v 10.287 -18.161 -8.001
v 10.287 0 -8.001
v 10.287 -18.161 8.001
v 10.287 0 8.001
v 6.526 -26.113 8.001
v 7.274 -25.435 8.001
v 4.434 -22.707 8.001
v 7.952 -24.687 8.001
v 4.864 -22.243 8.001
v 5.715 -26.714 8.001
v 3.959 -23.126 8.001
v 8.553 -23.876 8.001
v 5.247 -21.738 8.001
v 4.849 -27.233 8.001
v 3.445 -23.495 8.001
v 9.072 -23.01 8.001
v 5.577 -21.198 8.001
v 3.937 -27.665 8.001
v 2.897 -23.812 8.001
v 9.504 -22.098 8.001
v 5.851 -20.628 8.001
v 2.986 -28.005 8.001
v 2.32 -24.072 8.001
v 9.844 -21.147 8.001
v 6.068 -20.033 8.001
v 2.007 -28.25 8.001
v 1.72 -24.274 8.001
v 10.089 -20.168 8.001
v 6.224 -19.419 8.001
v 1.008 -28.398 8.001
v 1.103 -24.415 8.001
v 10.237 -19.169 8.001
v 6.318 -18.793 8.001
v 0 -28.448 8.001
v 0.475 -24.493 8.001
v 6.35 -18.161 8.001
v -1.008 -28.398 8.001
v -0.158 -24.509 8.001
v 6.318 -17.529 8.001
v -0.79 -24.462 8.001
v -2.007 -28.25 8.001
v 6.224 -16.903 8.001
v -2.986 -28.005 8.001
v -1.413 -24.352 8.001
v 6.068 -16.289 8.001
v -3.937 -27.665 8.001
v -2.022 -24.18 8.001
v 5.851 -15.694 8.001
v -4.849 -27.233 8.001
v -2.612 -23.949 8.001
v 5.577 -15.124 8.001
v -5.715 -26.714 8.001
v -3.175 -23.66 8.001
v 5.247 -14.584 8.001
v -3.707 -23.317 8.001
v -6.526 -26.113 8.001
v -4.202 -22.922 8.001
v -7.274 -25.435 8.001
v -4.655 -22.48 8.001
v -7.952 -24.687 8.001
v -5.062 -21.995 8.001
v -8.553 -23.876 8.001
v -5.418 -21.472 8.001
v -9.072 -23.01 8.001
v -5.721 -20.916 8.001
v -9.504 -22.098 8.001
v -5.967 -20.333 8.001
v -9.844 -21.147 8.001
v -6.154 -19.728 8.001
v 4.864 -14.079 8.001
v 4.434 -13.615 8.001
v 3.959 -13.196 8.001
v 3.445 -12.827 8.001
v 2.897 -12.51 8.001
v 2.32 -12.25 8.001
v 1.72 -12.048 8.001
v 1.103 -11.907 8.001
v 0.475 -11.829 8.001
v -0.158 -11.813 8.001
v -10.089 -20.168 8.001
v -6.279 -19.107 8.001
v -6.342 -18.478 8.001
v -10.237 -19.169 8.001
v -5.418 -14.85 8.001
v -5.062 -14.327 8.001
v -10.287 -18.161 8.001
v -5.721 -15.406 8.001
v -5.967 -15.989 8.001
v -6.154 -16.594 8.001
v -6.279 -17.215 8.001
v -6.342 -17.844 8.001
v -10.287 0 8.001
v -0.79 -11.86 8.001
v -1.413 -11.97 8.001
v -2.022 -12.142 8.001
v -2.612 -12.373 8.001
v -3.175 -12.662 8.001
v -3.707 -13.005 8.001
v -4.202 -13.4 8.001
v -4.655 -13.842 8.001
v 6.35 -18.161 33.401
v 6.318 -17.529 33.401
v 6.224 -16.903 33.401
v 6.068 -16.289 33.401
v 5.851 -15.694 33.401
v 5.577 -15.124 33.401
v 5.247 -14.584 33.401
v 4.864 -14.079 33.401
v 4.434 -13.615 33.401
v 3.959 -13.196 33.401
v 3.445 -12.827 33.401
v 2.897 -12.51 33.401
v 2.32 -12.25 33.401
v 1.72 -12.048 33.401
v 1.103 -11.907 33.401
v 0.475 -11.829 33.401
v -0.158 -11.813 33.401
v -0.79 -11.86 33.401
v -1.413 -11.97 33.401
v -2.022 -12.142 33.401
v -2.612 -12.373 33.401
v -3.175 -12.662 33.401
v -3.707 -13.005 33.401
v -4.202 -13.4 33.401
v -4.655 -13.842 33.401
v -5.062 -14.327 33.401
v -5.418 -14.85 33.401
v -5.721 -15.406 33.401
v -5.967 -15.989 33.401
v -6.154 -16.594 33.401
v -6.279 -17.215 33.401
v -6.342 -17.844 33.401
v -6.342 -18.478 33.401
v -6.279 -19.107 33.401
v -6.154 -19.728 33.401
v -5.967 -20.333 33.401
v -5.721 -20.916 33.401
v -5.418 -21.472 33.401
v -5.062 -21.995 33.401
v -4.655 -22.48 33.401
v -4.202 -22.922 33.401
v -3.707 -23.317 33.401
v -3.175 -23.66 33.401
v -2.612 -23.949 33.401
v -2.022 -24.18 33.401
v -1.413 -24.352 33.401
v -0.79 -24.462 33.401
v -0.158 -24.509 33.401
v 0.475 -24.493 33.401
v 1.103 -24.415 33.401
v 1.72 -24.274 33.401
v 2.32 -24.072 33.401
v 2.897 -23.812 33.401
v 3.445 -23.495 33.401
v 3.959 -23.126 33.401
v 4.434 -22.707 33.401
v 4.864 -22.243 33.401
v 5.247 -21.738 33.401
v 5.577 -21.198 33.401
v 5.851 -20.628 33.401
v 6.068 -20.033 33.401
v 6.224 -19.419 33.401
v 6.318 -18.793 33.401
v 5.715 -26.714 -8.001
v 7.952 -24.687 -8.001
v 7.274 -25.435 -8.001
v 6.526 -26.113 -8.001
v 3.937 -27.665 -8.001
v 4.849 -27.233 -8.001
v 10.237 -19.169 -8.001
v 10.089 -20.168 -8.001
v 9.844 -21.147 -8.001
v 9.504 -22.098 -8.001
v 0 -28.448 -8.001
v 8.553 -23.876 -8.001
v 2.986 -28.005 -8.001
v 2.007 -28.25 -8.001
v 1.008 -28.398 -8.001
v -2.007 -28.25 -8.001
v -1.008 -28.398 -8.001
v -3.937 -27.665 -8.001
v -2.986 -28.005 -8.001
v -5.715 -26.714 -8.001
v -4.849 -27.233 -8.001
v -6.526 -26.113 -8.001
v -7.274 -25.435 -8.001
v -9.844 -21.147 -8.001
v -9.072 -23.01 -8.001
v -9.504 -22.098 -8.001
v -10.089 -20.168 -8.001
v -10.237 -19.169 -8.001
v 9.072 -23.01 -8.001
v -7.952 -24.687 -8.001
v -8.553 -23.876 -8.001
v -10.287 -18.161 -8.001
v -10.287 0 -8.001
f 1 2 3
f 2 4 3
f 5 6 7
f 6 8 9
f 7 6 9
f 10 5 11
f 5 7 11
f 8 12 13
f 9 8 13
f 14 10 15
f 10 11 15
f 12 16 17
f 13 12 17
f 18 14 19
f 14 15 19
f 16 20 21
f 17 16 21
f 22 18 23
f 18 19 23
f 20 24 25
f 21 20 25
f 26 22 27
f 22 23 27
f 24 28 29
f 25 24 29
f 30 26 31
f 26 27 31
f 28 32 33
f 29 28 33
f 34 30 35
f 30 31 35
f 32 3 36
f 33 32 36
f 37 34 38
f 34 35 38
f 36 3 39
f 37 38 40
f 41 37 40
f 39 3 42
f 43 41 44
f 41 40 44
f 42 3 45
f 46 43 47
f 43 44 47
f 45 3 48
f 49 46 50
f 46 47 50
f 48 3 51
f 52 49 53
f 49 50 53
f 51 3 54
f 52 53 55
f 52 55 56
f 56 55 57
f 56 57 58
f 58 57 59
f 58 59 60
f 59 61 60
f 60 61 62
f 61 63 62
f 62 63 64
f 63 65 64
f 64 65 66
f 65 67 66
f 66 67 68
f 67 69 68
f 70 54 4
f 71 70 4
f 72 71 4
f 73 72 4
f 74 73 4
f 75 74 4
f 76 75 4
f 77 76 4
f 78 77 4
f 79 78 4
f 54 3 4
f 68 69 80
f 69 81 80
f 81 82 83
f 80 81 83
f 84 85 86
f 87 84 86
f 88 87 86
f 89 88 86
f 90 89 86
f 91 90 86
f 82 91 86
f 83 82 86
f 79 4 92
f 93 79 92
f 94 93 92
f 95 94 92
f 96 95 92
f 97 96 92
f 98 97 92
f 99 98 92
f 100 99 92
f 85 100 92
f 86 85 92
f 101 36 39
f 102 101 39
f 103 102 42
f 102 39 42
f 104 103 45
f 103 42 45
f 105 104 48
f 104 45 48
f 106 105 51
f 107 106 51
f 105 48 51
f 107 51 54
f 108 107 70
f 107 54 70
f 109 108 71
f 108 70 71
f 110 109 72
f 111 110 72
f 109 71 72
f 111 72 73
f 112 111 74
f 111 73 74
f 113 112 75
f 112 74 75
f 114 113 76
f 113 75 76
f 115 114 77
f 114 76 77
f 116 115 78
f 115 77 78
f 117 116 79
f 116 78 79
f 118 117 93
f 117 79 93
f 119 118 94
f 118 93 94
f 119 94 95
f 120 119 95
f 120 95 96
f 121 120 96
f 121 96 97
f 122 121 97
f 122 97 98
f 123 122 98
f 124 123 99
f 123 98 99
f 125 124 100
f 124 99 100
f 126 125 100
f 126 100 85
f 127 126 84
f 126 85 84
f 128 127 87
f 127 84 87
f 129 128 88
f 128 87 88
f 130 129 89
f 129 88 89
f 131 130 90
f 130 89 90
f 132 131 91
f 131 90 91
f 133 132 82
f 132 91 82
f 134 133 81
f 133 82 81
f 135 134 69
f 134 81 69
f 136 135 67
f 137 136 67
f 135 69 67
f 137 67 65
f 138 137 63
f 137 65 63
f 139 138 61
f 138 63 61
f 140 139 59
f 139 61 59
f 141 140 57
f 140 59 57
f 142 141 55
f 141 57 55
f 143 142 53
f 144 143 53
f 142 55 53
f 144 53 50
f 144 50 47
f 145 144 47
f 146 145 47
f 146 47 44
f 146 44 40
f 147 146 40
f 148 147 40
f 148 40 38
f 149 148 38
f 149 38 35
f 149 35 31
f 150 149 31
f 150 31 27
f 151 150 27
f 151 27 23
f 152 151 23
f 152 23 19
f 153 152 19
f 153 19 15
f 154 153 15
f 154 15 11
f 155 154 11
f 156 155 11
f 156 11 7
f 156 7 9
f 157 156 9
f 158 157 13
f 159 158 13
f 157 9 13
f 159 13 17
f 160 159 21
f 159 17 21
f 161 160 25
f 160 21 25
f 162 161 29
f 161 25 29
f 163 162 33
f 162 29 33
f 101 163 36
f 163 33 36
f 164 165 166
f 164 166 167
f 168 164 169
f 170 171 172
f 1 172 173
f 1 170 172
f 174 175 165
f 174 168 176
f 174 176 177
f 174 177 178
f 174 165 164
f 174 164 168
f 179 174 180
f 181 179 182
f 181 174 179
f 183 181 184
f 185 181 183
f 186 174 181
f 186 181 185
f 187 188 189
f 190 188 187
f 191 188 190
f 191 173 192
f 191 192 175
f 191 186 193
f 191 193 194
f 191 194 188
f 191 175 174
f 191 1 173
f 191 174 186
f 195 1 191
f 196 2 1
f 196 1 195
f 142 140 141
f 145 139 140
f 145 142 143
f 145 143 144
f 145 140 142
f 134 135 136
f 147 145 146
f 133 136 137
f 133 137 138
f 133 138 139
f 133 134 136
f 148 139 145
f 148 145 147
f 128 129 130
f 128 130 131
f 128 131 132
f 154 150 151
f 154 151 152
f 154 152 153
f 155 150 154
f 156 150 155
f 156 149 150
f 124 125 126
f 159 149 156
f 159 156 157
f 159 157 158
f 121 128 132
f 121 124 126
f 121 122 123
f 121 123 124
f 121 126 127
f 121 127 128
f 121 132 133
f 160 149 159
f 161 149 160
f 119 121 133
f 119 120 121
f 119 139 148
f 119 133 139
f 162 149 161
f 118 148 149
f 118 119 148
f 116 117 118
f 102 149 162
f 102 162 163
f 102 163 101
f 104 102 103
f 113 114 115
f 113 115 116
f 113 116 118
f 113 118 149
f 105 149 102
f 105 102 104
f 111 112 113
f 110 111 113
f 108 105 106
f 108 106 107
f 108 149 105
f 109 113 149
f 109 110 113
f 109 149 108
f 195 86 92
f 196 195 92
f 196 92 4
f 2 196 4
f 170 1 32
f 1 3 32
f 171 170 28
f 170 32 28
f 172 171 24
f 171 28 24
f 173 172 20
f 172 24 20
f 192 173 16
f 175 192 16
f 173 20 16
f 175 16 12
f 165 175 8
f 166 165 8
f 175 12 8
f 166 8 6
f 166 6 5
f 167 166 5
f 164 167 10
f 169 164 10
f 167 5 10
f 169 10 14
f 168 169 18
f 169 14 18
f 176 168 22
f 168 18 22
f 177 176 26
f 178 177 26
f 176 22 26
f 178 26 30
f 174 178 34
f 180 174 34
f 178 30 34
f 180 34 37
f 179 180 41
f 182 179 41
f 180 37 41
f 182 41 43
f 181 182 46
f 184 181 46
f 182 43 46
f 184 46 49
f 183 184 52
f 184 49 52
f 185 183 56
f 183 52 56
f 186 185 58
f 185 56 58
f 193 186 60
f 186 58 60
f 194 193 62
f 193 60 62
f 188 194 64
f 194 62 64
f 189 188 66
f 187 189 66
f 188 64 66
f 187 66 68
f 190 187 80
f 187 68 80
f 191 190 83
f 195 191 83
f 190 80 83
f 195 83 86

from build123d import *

# Parameters (mm, degrees)
BOSS_EXTRUDE1_DEPTH = 8.001
SKETCH2_R           = 6.35
BOSS_EXTRUDE2_DEPTH = 25.4


with BuildPart() as part:
    # Sketch1 → Boss-Extrude1 (new, symmetric)
    with BuildSketch(Plane.XY):
        with BuildLine():
            Line((-10.287, 0), (10.287, 0))
            Line((10.287, 0), (10.287, -18.161))
            ThreePointArc((10.287, -18.161), (0, -28.448), (-10.287, -18.161))
            Line((-10.287, -18.161), (-10.287, 0))
        make_face()
    extrude(amount=BOSS_EXTRUDE1_DEPTH, both=True)

    # Sketch2 → Boss-Extrude2 (add)
    with BuildSketch(Plane.XY.offset(8.001)):
        with Locations((0, -18.161)):
            Circle(SKETCH2_R)
    extrude(amount=BOSS_EXTRUDE2_DEPTH)


solid = part.part
